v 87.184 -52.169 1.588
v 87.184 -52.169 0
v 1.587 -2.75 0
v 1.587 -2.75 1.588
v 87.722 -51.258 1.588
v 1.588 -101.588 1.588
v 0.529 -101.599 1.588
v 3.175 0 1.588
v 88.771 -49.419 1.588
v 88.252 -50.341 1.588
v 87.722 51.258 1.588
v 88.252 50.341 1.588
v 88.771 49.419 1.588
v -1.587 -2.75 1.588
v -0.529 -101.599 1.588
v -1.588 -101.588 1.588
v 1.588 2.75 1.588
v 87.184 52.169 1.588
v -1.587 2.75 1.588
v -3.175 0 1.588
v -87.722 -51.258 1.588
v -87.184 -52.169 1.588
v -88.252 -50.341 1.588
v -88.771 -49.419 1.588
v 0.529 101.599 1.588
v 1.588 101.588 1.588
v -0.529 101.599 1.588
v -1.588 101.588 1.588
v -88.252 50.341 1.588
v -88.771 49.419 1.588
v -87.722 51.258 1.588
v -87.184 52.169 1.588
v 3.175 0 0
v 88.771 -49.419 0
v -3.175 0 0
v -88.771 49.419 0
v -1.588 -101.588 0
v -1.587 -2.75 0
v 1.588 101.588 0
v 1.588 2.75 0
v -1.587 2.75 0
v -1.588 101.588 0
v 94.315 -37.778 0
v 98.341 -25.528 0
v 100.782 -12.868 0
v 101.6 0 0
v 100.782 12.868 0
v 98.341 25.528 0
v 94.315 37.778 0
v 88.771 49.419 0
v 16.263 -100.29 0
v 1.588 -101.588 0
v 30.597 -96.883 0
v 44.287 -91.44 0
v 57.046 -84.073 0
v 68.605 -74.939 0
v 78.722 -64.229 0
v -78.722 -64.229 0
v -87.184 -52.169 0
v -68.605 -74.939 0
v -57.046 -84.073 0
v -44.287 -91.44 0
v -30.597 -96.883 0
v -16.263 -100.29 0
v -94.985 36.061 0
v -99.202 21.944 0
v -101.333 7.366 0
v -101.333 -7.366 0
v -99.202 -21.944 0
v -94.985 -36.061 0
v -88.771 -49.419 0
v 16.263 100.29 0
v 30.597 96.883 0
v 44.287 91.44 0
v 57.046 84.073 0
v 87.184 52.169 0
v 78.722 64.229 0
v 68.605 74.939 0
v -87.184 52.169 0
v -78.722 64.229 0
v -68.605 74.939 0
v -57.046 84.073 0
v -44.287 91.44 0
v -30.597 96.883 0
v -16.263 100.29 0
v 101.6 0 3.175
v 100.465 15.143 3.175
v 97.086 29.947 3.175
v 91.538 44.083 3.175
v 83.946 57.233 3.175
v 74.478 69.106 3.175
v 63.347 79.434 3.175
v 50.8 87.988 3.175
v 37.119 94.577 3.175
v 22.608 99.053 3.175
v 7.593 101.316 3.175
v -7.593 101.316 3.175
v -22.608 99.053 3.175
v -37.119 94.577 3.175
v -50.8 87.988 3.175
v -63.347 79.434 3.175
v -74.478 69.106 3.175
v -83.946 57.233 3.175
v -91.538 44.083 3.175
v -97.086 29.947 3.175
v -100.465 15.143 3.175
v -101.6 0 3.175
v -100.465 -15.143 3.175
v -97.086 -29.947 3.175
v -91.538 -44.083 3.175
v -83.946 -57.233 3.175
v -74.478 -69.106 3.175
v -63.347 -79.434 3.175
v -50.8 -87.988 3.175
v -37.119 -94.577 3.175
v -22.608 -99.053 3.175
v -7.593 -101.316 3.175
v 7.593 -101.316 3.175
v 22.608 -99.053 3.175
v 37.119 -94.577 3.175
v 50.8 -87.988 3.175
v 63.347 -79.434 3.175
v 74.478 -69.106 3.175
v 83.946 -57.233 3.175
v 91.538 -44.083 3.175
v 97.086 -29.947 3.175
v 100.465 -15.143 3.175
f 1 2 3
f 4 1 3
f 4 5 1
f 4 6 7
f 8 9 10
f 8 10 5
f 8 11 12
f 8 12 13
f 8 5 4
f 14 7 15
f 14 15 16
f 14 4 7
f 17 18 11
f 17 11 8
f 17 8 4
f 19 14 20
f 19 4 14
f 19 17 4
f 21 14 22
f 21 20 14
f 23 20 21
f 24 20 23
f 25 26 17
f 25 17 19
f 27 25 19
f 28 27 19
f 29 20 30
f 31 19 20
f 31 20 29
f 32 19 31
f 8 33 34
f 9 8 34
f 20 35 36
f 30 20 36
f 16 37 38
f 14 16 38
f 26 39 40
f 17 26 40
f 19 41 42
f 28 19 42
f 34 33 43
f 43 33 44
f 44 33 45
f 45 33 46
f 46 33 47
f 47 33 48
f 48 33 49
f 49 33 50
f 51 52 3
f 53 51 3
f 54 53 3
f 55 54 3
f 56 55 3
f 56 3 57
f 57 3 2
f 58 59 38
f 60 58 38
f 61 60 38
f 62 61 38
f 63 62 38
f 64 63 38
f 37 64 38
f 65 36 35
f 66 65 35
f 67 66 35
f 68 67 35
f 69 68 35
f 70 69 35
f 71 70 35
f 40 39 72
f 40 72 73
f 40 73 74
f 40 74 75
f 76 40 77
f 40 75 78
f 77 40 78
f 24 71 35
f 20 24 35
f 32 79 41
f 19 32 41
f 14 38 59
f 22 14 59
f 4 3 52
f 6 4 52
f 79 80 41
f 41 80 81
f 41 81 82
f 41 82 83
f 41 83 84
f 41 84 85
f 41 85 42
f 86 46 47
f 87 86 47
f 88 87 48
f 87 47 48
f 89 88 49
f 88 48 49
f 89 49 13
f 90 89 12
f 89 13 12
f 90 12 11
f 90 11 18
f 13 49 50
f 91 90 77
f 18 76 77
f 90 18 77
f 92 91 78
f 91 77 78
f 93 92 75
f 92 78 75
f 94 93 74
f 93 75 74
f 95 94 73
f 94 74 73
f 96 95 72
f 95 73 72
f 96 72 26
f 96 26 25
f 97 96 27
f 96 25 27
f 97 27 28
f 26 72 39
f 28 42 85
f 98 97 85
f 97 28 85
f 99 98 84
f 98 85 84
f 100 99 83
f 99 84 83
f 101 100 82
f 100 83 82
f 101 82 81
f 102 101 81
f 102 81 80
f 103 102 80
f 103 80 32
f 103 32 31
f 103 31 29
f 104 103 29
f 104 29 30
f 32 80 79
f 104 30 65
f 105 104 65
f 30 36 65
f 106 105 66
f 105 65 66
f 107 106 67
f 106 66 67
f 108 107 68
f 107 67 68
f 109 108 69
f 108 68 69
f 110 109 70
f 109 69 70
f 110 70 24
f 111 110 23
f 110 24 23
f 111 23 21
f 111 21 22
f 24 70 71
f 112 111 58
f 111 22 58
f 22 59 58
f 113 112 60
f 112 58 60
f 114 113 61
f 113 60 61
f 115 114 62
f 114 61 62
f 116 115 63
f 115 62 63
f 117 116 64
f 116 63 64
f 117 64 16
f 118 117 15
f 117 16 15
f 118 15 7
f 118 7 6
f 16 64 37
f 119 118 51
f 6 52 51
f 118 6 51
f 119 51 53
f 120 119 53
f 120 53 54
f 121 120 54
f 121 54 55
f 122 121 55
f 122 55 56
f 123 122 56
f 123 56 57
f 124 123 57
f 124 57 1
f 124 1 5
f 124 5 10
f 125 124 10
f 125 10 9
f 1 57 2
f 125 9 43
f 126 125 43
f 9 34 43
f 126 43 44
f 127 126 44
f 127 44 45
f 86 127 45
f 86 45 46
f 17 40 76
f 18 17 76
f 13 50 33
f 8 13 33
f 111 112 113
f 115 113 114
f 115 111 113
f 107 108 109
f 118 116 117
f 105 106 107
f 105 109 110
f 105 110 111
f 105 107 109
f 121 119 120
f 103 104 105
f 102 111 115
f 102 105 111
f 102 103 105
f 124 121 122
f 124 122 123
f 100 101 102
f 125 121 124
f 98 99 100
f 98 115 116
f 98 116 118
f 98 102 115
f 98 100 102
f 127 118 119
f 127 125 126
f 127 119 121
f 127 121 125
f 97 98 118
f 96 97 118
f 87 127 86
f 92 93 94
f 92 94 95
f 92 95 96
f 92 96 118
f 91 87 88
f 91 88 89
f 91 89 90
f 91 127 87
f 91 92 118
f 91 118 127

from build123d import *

# Parameters (mm, degrees)
SKETCH1_R           = 101.6
BOSS_EXTRUDE1_DEPTH = 3.175
CUT_EXTRUDE3_DEPTH  = 1.5875


with BuildPart() as part:
    # Sketch1 → Boss-Extrude1 (new body)
    with BuildSketch(Plane.XY):
        Circle(SKETCH1_R)
    extrude(amount=BOSS_EXTRUDE1_DEPTH)

    # Sketch2 → Cut-Extrude3 (cut)
    with BuildSketch(Plane(origin=(0, 0, 0), x_dir=(-1, 0, 0), z_dir=(0, 0, -1))):
        with BuildLine():
            ThreePointArc((-88.771189624, -49.418983121), (-87.988181024, -50.8), (-87.183689624, -52.168613778))
            Line((-87.183689624, -52.168613778), (-1.5875, -2.749630657))
            Line((-1.5875, -2.749630657), (-1.5875, -0.916543552))
            Line((-1.5875, -0.916543552), (-3.175, 0))
            Line((-3.175, 0), (-88.771189624, -49.418983121))
        make_face()
        Polygon((-1.5875, -0.916543552), (-1.5875, -2.749630657), (0, -1.833087105), align=None)
        Polygon((-1.5875, -0.916543552), (0, -1.833087105), (1.5875, -0.916543552), (1.5875, 0.916543552), (0, 1.833087105), (-1.5875, 0.916543552), align=None)
        Polygon((1.5875, -0.916543552), (0, -1.833087105), (1.5875, -2.749630657), align=None)
        Polygon((-3.175, 0), (-1.5875, -0.916543552), (-1.5875, 0.916543552), align=None)
        Polygon((-1.5875, 2.749630657), (-1.5875, 0.916543552), (0, 1.833087105), align=None)
        Polygon((0, 1.833087105), (1.5875, 0.916543552), (1.5875, 2.749630657), align=None)
        Polygon((1.5875, 0.916543552), (1.5875, -0.916543552), (3.175, 0), align=None)
        with BuildLine():
            Line((1.5875, 0.916543552), (3.175, 0))
            Line((3.175, 0), (88.771189624, 49.418983121))
            ThreePointArc((88.771189624, 49.418983121), (87.988181024, 50.8), (87.183689624, 52.168613778))
            Line((87.183689624, 52.168613778), (1.5875, 2.749630657))
            Line((1.5875, 2.749630657), (1.5875, 0.916543552))
        make_face()
        with BuildLine():
            Line((3.175, 0), (1.5875, -0.916543552))
            Line((1.5875, -0.916543552), (1.5875, -2.749630657))
            Line((1.5875, -2.749630657), (87.183689624, -52.168613778))
            ThreePointArc((87.183689624, -52.168613778), (87.988181024, -50.8), (88.771189624, -49.418983121))
            Line((88.771189624, -49.418983121), (3.175, 0))
        make_face()
        with BuildLine():
            Line((-1.5875, 2.749630657), (0, 1.833087105))
            Line((0, 1.833087105), (1.5875, 2.749630657))
            Line((1.5875, 2.749630657), (1.5875, 101.587596899))
            ThreePointArc((1.5875, 101.587596899), (0, 101.6), (-1.5875, 101.587596899))
            Line((-1.5875, 101.587596899), (-1.5875, 2.749630657))
        make_face()
        with BuildLine():
            Line((-88.771189624, 49.418983121), (-3.175, 0))
            Line((-3.175, 0), (-1.5875, 0.916543552))
            Line((-1.5875, 0.916543552), (-1.5875, 2.749630657))
            Line((-1.5875, 2.749630657), (-87.183689624, 52.168613778))
            ThreePointArc((-87.183689624, 52.168613778), (-87.988181024, 50.8), (-88.771189624, 49.418983121))
        make_face()
        with BuildLine():
            Line((0, -1.833087105), (-1.5875, -2.749630657))
            Line((-1.5875, -2.749630657), (-1.5875, -101.587596899))
            ThreePointArc((-1.5875, -101.587596899), (0, -101.6), (1.5875, -101.587596899))
            Line((1.5875, -101.587596899), (1.5875, -2.749630657))
            Line((1.5875, -2.749630657), (0, -1.833087105))
        make_face()
    extrude(amount=-CUT_EXTRUDE3_DEPTH, mode=Mode.SUBTRACT)


solid = part.part
